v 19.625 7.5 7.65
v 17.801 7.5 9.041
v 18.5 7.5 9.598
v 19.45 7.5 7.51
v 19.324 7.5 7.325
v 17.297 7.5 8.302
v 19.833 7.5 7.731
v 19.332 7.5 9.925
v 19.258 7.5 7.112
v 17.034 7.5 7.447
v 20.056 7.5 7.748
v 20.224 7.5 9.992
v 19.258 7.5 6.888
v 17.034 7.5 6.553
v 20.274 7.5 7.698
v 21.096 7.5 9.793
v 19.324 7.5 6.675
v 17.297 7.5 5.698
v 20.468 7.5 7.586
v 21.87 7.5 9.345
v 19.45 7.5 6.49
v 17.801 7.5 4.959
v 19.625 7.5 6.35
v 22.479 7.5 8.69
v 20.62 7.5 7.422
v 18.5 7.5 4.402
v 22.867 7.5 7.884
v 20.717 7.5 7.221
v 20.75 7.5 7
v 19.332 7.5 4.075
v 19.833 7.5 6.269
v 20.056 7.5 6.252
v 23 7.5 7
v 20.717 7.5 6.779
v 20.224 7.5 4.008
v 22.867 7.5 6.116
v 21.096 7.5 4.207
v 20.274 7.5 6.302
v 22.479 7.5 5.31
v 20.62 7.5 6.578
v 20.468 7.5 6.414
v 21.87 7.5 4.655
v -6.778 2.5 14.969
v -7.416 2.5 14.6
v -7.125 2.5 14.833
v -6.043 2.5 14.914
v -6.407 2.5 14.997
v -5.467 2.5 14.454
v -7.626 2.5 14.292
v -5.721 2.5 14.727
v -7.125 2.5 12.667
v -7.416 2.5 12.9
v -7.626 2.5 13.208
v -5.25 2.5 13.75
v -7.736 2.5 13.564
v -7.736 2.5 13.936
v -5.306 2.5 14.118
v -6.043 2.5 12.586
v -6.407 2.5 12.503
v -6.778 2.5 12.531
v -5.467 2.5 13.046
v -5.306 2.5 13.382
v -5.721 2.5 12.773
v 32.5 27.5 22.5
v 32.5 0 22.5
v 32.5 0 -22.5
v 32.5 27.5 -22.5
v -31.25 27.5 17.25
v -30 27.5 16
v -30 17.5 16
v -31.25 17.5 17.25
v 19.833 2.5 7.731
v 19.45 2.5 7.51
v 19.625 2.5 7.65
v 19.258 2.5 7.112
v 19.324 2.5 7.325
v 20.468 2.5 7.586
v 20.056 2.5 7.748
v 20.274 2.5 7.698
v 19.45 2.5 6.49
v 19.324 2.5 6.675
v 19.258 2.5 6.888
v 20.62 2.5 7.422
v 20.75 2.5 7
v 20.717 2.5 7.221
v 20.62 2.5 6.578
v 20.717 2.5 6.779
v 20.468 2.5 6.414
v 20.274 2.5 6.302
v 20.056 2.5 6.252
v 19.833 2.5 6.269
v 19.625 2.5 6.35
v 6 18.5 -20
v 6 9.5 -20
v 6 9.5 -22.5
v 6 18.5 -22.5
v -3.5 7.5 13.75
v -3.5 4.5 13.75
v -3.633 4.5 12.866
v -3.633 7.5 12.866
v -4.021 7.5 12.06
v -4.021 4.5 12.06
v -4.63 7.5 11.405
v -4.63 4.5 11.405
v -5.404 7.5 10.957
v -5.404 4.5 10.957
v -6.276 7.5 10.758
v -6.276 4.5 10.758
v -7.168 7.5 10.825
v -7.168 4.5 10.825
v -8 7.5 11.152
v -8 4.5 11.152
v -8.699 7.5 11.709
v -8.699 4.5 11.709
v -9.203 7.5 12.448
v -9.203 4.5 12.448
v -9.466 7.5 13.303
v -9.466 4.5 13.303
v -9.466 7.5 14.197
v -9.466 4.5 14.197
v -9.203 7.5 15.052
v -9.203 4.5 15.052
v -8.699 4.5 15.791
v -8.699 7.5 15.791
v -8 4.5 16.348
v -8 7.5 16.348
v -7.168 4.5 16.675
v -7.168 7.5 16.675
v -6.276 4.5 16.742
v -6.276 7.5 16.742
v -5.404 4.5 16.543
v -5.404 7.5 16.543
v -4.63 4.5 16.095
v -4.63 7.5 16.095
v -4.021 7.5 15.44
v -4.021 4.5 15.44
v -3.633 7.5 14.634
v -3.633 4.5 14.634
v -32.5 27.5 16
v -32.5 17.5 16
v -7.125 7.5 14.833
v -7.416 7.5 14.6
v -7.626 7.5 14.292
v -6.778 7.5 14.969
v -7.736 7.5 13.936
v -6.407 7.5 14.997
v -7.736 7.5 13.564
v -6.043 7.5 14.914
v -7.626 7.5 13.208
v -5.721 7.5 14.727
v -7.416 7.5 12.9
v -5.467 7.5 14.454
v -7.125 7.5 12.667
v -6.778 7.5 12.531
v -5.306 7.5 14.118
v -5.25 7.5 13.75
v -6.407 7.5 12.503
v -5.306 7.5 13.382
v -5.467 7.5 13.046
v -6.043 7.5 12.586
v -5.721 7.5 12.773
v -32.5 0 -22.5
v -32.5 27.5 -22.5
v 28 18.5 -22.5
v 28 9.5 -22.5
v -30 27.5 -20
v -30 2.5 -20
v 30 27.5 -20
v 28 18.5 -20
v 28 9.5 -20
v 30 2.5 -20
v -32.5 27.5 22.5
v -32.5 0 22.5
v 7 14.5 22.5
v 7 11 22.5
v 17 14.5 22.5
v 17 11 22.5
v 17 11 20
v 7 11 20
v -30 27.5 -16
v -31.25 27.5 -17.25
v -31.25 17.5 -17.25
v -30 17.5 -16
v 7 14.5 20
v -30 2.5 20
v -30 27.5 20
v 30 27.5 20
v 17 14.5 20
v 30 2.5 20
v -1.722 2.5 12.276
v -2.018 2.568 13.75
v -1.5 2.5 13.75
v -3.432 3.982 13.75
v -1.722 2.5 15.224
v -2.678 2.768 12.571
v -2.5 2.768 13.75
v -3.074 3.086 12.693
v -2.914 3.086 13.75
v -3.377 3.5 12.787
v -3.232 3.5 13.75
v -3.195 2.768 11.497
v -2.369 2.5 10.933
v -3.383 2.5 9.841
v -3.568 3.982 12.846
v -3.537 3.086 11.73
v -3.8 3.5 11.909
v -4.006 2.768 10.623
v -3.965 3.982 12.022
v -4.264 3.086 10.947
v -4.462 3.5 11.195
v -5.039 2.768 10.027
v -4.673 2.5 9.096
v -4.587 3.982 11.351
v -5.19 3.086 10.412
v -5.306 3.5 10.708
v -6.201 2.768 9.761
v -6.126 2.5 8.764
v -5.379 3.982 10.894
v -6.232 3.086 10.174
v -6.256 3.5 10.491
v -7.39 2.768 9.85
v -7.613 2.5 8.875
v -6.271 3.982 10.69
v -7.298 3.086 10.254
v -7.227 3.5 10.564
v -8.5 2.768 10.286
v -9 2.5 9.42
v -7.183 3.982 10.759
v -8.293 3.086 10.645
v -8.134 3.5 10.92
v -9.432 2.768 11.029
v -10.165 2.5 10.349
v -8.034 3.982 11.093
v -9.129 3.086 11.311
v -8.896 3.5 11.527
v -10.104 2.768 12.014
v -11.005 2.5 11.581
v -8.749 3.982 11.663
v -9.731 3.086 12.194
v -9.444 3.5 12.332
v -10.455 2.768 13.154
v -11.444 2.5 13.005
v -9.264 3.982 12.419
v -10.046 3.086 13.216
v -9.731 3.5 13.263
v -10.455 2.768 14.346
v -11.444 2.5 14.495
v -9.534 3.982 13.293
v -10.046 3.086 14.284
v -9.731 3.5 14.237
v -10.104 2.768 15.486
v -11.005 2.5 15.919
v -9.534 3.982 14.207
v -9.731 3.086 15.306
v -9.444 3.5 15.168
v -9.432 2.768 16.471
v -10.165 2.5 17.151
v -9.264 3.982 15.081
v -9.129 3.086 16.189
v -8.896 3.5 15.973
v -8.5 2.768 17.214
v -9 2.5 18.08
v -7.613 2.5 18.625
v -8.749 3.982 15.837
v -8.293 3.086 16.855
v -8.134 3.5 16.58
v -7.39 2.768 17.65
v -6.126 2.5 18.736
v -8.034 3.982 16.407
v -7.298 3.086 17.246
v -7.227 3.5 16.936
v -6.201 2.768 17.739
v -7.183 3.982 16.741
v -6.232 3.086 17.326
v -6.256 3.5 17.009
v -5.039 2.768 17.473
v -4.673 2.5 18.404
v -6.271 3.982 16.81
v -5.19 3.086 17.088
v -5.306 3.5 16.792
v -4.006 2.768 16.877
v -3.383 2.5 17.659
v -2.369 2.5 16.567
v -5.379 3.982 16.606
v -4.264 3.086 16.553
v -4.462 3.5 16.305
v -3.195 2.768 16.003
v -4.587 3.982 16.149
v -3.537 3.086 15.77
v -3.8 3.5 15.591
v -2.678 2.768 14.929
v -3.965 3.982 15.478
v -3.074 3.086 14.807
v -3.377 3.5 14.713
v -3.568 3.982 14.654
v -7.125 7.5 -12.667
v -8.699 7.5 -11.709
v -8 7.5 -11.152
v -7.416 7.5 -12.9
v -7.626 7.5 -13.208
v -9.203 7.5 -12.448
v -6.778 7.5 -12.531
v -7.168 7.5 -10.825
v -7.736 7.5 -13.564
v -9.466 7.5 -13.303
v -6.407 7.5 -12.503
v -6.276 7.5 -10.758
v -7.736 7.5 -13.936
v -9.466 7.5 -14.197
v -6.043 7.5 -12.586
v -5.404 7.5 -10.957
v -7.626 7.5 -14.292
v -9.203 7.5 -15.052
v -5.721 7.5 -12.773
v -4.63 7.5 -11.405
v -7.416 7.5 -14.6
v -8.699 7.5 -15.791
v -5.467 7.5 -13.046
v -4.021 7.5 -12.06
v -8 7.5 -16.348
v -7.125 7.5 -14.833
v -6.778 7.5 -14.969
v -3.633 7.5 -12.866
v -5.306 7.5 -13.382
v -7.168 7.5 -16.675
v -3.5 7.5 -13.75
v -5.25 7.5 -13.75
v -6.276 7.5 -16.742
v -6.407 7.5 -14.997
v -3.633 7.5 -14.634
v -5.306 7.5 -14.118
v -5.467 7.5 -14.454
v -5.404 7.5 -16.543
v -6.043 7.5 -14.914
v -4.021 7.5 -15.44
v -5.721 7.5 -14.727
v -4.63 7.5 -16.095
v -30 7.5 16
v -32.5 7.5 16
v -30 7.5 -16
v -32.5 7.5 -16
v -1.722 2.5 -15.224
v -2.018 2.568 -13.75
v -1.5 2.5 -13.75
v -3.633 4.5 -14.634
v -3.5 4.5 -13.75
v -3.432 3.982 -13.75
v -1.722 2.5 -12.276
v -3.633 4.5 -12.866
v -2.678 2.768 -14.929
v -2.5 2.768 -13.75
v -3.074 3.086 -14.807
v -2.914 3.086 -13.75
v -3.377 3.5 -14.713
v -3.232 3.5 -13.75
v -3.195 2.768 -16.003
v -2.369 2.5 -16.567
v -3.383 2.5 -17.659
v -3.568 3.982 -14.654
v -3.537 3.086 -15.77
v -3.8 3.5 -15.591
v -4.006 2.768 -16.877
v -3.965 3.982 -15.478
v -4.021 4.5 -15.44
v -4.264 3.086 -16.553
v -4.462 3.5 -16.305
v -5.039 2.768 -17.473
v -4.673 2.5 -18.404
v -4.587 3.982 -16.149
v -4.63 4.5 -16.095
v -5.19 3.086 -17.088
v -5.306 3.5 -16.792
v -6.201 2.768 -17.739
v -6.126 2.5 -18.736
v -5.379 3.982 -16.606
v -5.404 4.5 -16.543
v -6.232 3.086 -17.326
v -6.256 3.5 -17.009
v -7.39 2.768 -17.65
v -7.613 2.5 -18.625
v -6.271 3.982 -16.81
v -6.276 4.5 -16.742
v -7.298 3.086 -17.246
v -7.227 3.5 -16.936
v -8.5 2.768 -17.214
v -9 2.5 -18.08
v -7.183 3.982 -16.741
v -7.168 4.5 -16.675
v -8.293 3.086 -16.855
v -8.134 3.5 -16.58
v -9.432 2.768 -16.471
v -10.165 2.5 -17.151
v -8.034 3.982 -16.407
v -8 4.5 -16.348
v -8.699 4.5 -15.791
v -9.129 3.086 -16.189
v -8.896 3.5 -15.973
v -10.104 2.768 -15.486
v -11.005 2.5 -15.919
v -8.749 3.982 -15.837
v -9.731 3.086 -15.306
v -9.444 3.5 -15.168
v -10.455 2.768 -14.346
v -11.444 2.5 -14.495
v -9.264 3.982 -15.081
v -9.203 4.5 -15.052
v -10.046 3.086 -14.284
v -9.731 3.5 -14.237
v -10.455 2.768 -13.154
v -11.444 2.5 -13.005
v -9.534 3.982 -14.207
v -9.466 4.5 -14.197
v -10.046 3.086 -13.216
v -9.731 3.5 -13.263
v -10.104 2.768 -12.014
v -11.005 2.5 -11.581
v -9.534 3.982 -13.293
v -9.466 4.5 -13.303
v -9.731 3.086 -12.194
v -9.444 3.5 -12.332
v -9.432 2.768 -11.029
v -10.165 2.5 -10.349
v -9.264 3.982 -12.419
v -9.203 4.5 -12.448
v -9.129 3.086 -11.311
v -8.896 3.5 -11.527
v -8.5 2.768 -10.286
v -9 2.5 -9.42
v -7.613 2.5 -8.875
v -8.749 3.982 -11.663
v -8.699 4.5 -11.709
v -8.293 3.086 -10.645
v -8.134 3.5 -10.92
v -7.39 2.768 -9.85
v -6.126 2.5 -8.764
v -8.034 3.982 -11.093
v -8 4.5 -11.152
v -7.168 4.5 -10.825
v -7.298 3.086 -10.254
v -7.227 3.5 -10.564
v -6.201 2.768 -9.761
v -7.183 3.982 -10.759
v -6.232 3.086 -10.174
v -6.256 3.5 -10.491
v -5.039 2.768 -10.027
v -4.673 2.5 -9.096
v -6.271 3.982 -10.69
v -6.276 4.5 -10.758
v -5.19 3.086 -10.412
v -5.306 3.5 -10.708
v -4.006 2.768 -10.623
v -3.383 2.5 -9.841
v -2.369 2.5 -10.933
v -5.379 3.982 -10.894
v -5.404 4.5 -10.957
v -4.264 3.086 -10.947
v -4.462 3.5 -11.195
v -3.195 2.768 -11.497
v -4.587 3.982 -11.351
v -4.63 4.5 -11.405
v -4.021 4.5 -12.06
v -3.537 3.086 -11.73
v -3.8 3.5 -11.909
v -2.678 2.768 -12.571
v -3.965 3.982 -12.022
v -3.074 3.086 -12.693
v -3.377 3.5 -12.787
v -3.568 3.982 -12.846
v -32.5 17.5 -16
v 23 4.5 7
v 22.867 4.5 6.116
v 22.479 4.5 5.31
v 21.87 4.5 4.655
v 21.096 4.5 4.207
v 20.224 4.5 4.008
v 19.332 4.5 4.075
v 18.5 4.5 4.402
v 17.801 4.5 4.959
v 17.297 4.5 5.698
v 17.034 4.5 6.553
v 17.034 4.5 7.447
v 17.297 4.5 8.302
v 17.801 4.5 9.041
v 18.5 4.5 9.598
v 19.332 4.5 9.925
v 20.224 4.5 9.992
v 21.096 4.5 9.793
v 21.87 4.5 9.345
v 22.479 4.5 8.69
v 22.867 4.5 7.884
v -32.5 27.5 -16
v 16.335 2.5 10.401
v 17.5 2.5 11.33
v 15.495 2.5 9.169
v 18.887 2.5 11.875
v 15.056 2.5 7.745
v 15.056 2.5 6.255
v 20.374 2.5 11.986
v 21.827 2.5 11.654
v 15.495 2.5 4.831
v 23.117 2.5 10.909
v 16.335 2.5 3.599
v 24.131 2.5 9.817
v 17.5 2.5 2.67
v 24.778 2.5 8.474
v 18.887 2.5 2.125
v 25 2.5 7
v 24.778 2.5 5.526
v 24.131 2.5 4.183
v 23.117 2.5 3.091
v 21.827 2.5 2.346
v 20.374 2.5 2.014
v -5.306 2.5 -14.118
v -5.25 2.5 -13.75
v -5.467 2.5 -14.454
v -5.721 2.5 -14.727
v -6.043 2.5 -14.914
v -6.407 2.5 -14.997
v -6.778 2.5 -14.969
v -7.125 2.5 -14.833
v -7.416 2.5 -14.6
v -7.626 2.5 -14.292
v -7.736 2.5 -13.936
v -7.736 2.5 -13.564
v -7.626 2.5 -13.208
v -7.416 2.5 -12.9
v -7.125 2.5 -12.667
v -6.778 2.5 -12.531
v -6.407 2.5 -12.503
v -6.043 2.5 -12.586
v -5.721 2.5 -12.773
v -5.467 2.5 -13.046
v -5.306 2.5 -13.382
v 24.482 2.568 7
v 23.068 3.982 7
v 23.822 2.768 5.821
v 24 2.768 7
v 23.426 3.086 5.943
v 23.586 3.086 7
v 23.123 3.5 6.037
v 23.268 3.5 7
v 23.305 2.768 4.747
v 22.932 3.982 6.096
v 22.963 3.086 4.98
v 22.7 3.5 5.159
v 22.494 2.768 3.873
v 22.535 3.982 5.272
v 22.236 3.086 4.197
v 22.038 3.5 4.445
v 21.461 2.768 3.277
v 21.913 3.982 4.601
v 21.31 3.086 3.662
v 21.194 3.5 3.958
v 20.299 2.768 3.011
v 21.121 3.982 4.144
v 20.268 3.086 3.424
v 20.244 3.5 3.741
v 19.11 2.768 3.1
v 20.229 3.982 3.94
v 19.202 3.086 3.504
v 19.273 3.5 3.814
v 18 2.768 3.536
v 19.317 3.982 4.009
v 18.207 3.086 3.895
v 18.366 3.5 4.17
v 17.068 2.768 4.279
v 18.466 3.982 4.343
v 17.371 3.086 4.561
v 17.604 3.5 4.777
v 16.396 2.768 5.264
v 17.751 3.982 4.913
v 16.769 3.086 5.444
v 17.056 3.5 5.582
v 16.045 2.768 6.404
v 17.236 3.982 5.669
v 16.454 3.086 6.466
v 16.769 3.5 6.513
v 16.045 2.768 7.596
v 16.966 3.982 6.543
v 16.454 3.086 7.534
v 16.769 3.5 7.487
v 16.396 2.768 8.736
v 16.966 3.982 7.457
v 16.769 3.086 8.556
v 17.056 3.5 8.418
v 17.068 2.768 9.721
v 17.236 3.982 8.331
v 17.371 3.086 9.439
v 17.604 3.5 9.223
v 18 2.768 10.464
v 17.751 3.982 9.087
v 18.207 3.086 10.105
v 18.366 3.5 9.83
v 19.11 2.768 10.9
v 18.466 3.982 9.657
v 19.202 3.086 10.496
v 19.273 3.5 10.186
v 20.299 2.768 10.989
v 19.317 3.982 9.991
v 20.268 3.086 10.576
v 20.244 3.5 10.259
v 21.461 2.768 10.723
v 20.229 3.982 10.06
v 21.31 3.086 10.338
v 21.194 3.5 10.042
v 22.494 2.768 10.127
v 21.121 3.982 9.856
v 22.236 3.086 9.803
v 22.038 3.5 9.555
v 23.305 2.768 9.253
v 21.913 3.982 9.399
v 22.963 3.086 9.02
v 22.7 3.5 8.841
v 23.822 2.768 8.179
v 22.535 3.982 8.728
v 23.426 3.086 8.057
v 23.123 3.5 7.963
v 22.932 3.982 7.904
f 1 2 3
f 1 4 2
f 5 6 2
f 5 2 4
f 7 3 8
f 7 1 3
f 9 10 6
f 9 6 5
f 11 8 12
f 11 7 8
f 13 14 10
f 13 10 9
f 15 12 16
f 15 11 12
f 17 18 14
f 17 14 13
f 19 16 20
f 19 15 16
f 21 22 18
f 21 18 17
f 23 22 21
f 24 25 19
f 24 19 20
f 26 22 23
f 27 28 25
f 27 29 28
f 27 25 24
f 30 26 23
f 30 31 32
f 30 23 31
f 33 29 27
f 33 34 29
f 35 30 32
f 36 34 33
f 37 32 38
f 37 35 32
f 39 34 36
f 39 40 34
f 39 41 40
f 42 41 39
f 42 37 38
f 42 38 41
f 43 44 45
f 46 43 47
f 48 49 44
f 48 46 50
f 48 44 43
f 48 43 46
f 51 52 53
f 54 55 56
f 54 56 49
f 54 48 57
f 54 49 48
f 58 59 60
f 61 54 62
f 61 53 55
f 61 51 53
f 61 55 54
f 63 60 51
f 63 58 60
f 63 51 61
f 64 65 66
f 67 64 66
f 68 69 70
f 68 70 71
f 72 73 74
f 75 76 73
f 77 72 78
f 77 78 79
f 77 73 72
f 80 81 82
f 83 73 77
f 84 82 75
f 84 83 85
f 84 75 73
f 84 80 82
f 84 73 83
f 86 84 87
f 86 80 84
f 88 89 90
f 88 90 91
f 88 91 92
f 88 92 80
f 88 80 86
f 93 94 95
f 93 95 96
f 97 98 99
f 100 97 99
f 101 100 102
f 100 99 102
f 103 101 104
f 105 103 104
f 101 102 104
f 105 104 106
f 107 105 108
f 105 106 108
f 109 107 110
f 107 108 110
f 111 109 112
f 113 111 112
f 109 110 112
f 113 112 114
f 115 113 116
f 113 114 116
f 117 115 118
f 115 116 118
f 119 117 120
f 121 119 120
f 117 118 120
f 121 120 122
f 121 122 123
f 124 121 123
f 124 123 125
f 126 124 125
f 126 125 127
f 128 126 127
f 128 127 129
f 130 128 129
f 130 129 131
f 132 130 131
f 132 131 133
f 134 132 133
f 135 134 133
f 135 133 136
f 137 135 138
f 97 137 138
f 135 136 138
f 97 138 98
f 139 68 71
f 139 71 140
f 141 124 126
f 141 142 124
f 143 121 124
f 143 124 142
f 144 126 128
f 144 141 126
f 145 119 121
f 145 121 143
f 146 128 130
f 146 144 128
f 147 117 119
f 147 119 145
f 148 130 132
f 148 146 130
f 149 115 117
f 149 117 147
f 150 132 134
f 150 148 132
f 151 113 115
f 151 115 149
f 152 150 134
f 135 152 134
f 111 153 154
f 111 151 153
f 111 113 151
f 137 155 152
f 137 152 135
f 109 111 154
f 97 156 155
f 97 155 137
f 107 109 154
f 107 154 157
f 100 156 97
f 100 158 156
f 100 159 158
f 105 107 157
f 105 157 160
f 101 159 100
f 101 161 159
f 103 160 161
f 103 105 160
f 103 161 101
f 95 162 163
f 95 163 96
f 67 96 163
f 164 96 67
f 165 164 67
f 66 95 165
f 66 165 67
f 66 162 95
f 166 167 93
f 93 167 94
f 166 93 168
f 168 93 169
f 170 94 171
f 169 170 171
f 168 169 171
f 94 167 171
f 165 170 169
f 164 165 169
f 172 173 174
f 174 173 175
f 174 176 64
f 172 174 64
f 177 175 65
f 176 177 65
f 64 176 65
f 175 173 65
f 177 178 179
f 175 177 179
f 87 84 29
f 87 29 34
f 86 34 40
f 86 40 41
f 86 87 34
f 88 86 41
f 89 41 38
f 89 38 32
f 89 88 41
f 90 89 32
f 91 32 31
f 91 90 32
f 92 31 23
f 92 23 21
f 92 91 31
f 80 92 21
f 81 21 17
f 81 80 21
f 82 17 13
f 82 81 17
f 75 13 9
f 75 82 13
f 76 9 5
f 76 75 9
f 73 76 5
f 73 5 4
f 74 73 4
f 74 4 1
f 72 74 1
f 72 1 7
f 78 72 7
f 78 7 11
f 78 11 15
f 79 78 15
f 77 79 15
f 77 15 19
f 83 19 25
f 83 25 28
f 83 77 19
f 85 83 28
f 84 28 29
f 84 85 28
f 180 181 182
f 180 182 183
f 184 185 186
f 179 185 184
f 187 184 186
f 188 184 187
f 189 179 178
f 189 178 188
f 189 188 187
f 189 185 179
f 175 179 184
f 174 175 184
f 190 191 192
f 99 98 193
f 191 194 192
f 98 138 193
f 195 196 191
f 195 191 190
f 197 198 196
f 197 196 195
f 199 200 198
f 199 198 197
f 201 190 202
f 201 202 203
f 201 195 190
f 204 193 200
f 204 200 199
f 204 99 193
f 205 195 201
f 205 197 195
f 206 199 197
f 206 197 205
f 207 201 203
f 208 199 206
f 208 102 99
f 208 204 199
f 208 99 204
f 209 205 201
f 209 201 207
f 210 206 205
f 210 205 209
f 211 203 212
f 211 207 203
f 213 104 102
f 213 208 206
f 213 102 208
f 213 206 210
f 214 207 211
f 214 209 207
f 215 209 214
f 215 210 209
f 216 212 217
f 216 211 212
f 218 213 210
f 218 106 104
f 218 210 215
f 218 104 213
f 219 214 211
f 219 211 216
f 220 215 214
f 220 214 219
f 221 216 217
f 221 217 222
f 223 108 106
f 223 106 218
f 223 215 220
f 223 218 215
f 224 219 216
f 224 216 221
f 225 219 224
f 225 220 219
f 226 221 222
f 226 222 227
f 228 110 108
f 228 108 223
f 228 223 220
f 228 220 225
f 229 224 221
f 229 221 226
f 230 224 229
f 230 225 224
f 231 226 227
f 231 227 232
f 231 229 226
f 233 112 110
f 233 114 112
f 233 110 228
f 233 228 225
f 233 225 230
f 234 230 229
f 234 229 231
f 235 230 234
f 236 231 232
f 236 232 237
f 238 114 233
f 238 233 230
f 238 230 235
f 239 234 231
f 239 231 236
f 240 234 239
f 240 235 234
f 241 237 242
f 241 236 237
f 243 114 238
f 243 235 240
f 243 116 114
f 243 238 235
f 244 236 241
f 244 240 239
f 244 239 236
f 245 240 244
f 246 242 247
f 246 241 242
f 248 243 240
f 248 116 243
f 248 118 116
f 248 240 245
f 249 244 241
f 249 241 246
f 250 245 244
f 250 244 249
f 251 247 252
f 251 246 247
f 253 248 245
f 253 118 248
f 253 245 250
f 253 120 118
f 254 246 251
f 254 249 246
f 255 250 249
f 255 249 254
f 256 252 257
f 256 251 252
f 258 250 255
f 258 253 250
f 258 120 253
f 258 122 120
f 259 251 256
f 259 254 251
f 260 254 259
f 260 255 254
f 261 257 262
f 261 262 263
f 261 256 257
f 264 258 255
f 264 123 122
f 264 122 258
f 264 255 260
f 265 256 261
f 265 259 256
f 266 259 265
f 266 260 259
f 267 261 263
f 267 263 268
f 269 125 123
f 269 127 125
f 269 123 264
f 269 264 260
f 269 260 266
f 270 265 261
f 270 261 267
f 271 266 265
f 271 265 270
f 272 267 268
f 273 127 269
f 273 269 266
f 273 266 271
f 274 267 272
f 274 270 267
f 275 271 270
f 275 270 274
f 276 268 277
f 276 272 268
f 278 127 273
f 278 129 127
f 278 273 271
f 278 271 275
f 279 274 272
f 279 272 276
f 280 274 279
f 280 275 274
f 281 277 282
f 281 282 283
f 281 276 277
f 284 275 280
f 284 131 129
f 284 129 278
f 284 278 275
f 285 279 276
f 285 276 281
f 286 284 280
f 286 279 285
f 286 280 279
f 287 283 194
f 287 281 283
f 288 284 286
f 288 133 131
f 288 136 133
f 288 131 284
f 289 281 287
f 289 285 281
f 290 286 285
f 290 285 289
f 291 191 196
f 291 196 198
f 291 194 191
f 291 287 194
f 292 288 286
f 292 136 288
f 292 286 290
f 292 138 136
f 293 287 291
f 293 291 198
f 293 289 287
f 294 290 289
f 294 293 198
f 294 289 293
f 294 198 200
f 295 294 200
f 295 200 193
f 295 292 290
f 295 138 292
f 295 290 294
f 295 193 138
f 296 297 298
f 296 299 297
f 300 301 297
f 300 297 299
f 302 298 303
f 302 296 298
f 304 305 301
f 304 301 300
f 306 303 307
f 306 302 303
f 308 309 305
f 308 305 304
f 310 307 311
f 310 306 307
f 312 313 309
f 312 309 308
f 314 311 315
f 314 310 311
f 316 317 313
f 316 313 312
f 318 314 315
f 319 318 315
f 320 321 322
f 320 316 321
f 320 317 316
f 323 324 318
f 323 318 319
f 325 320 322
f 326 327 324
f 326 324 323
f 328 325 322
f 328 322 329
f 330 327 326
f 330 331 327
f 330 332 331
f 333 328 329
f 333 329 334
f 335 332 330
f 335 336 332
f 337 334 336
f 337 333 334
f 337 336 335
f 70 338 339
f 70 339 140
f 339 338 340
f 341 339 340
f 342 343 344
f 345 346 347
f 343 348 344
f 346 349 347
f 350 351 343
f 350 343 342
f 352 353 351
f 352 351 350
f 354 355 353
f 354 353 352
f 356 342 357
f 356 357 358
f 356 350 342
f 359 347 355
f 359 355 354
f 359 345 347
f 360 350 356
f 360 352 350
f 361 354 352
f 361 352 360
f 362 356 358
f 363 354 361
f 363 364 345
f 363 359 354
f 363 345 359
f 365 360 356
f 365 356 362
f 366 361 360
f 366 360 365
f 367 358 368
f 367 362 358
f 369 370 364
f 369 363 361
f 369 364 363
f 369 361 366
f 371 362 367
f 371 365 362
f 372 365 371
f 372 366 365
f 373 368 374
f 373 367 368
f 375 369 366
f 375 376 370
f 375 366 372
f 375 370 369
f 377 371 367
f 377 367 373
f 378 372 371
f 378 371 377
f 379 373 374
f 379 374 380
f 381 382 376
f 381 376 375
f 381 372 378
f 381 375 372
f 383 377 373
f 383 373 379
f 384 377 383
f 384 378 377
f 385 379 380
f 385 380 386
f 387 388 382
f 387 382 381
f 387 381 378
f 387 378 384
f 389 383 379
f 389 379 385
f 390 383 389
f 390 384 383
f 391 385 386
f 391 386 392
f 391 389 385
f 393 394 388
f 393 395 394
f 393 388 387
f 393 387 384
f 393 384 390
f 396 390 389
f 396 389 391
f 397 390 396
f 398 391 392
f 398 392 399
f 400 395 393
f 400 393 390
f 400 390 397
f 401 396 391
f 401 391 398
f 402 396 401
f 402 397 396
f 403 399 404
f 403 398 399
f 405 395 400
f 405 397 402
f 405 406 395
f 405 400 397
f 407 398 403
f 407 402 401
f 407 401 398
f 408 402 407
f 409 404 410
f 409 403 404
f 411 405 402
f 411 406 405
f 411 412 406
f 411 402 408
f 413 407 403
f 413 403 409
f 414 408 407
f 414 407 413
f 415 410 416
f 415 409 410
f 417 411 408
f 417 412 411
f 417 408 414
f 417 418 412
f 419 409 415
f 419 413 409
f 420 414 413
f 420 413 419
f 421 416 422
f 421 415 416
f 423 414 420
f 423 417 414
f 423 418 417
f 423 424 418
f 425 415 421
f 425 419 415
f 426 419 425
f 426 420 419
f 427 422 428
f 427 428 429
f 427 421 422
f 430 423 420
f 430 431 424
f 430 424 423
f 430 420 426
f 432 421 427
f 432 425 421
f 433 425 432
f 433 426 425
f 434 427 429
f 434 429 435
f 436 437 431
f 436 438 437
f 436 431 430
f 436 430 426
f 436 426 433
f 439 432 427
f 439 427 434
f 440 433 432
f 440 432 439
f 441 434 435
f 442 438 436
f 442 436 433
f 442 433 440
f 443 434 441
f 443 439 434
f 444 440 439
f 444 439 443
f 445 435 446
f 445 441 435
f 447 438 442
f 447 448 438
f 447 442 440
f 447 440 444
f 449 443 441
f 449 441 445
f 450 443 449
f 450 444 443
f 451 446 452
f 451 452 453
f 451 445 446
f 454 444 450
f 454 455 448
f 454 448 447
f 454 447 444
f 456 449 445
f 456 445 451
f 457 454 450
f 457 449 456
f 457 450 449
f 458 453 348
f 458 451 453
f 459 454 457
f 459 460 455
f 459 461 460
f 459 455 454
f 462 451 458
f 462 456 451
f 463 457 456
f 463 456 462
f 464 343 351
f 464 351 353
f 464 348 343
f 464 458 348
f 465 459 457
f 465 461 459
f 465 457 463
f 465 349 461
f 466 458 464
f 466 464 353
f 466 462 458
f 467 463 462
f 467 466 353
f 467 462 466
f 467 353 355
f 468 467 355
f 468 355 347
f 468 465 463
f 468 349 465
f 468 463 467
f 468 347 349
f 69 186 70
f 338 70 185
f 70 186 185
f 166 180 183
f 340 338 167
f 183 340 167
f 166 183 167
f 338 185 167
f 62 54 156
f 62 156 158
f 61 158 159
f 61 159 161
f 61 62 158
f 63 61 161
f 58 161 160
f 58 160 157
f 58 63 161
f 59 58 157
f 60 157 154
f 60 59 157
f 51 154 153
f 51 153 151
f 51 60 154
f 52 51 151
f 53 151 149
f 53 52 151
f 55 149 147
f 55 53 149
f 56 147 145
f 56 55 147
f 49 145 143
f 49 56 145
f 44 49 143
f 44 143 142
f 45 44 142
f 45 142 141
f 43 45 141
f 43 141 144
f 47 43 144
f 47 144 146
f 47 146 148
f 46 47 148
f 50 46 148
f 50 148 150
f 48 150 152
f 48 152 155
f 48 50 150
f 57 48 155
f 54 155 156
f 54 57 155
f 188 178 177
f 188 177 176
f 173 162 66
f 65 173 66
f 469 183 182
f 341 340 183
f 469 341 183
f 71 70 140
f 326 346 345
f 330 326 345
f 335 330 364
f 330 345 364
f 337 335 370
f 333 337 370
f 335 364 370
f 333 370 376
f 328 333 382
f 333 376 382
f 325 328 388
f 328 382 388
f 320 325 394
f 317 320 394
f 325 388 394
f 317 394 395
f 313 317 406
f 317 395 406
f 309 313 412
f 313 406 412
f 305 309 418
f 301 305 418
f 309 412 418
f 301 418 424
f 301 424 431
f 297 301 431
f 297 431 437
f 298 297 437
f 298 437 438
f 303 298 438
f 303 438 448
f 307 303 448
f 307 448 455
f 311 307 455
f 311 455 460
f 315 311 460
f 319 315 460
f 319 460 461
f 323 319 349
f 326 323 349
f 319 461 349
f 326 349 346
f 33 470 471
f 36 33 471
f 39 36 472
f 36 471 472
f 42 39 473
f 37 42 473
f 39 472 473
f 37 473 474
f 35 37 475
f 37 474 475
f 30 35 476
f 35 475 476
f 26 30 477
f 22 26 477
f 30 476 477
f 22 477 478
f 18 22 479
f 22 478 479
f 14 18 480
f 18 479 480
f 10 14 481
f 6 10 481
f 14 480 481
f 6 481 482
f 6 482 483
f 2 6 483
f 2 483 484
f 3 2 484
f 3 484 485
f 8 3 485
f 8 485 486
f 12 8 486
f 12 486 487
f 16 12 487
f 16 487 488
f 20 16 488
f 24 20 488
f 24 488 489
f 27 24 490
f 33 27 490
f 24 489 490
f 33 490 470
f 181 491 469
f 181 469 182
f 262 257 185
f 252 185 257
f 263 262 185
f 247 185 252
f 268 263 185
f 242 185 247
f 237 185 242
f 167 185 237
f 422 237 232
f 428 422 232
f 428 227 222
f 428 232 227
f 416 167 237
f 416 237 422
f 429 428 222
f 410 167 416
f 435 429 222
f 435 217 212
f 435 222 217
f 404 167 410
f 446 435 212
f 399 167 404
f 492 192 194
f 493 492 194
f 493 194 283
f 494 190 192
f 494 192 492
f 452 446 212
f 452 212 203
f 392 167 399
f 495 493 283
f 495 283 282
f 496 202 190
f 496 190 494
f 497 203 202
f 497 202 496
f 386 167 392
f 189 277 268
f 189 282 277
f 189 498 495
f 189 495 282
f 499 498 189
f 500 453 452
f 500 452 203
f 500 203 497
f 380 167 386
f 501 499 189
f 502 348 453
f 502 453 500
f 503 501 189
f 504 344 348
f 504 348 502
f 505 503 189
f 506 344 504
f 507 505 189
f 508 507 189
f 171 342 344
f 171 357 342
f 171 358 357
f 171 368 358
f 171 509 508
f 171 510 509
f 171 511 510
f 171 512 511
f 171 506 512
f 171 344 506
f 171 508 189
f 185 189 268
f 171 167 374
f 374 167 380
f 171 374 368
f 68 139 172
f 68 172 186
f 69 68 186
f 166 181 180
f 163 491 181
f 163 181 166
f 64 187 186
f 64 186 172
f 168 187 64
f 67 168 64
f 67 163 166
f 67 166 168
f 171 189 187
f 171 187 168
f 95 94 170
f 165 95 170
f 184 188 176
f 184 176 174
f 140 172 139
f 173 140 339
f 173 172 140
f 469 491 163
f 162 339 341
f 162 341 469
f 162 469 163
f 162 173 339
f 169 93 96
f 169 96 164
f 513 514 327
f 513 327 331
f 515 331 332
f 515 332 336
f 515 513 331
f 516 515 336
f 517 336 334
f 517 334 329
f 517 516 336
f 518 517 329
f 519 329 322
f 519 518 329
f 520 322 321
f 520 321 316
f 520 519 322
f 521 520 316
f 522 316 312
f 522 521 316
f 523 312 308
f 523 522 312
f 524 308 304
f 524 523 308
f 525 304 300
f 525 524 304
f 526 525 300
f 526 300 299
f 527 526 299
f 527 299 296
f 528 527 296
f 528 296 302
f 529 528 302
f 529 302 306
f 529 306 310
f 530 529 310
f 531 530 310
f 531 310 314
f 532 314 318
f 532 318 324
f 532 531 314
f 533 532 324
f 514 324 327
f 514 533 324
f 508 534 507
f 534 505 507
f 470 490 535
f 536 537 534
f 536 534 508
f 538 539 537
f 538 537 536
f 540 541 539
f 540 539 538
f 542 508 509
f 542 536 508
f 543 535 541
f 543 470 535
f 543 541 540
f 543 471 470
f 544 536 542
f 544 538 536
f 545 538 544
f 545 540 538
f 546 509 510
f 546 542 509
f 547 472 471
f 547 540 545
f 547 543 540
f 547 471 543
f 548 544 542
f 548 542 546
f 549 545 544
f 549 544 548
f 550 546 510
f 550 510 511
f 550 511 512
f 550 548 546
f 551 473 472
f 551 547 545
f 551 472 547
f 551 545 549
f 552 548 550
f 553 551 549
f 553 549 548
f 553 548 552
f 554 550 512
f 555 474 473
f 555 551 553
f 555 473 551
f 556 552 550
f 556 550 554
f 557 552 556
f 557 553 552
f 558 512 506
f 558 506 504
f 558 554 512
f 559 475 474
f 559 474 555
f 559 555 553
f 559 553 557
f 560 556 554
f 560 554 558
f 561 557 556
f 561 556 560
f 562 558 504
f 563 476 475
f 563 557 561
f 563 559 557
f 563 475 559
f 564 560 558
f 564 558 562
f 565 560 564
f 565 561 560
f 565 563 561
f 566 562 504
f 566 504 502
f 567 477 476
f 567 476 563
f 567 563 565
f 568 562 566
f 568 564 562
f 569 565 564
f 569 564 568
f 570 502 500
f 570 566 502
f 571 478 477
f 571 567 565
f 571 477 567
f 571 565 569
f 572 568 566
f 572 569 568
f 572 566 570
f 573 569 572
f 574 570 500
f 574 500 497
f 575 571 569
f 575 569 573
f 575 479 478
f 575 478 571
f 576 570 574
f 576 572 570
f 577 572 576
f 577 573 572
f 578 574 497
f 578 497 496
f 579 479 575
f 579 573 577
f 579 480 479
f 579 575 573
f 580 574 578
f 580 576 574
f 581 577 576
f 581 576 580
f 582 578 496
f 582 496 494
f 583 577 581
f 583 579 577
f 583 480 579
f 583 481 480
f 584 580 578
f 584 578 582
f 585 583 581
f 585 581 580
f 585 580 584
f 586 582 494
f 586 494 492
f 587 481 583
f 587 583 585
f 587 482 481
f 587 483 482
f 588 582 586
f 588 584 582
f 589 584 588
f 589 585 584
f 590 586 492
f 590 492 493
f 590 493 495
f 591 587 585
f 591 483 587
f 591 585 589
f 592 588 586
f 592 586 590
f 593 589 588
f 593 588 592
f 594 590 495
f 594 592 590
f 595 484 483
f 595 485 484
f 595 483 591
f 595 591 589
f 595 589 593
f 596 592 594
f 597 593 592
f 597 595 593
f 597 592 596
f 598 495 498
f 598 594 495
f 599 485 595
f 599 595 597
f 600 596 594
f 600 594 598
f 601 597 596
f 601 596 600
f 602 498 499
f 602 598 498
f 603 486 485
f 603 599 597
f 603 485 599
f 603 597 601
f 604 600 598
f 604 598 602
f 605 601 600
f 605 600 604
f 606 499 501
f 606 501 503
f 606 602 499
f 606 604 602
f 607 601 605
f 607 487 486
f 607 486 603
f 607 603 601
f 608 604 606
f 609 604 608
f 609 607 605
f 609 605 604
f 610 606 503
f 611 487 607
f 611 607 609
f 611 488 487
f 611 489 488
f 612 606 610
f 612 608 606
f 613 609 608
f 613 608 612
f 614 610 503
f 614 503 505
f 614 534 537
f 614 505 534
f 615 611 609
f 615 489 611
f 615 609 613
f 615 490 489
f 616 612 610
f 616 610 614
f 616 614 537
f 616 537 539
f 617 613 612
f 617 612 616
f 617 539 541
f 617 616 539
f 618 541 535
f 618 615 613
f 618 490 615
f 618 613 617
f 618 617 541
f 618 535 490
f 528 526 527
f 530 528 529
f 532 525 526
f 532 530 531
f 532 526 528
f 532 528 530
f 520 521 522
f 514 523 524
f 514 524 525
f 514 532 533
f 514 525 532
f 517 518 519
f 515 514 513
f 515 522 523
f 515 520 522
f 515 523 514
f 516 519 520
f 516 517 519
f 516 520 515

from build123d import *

# Parameters (mm, degrees)
SKETCH_1_W          = 65
SKETCH_1_H          = 45
EXTRUDE_1_DEPTH     = 27.5
SHELL_1_T           = -2.5
SKETCH_3_W          = 32
SKETCH_3_H          = 20
CUT_EXTRUDE_1_DEPTH = 3.5
CUT_EXTRUDE_2_DEPTH = 10
SKETCH_5_R          = 3
SKETCH_5_R_2        = 1.25
EXTRUDE_2_DEPTH     = 5
SKETCH_6_R          = 3
SKETCH_6_R_2        = 0.75
EXTRUDE_3_DEPTH     = 5
SKETCH_7_W          = 22
SKETCH_7_H          = 9
CUT_EXTRUDE_3_DEPTH = 3.5
SKETCH_8_W          = 10
SKETCH_8_H          = 3.5
CUT_EXTRUDE_4_DEPTH = 3.5
FILLET_1_R          = 2


with BuildPart() as part:
    # 草图1 → 凸台-拉伸1 (new body)
    with BuildSketch(Plane(origin=(0, 0, 0), x_dir=(1, 0, 0), z_dir=(0, 1, 0))):
        Rectangle(SKETCH_1_W, SKETCH_1_H)
    extrude(amount=EXTRUDE_1_DEPTH)

    # 抽壳1
    shell_1_openings = [part.faces().sort_by_distance(p)[0] for p in [
        (0, 27.5, 0),
    ]]
    offset(amount=SHELL_1_T, openings=shell_1_openings, kind=Kind.INTERSECTION)

    # 草图3 → 切除-拉伸1 (cut, through all)
    with BuildSketch(Plane(origin=(-30, 0, 0), x_dir=(0, 0, -1), z_dir=(1, 0, 0))):
        with Locations((0, 17.5)):
            Rectangle(SKETCH_3_W, SKETCH_3_H)
    extrude(amount=-CUT_EXTRUDE_1_DEPTH, mode=Mode.SUBTRACT)

    # 草图4 → 切除-拉伸2 (cut)
    with BuildSketch(Plane(origin=(0, 27.5, 0), x_dir=(1, 0, 0), z_dir=(0, 1, 0))):
        Polygon((-32.5, 16), (-31.25, 17.25), (-30, 16), align=None)
        Polygon((-32.5, -16), (-30, -16), (-31.25, -17.25), align=None)
    extrude(amount=-CUT_EXTRUDE_2_DEPTH, mode=Mode.SUBTRACT)

    # 草图5 → 凸台-拉伸2 (add)
    with BuildSketch(Plane(origin=(0, 2.5, 0), x_dir=(1, 0, 0), z_dir=(0, 1, 0))):
        with Locations((-6.5, 13.75)):
            Circle(SKETCH_5_R)
        with Locations((-6.5, 13.75)):
            Circle(SKETCH_5_R_2, mode=Mode.SUBTRACT)
        with Locations((-6.5, -13.75)):
            Circle(SKETCH_5_R)
        with Locations((-6.5, -13.75)):
            Circle(SKETCH_5_R_2, mode=Mode.SUBTRACT)
    extrude(amount=EXTRUDE_2_DEPTH)

    # 草图6 → 凸台-拉伸3 (add)
    with BuildSketch(Plane(origin=(0, 2.5, 0), x_dir=(1, 0, 0), z_dir=(0, 1, 0))):
        with Locations((20, -7)):
            Circle(SKETCH_6_R)
        with Locations((20, -7)):
            Circle(SKETCH_6_R_2, mode=Mode.SUBTRACT)
    extrude(amount=EXTRUDE_3_DEPTH)

    # 草图7 → 切除-拉伸3 (cut, through all)
    with BuildSketch(Plane.XY.offset(-20)):
        with Locations((17, 14)):
            Rectangle(SKETCH_7_W, SKETCH_7_H)
    extrude(amount=-CUT_EXTRUDE_3_DEPTH, mode=Mode.SUBTRACT)

    # 草图8 → 切除-拉伸4 (cut, through all)
    with BuildSketch(Plane(origin=(0, 0, 20), x_dir=(-1, 0, 0), z_dir=(0, 0, -1))):
        with Locations((-12, 12.75)):
            Rectangle(SKETCH_8_W, SKETCH_8_H)
    extrude(amount=-CUT_EXTRUDE_4_DEPTH, mode=Mode.SUBTRACT)

    # 圆角1
    fillet_1_edges = [part.edges().sort_by_distance(p)[0] for p in [
        (-9.5, 2.5, -13.75),
        (-9.5, 2.5, 13.75),
        (17, 2.5, 7),
    ]]
    fillet(fillet_1_edges, radius=FILLET_1_R)


solid = part.part
